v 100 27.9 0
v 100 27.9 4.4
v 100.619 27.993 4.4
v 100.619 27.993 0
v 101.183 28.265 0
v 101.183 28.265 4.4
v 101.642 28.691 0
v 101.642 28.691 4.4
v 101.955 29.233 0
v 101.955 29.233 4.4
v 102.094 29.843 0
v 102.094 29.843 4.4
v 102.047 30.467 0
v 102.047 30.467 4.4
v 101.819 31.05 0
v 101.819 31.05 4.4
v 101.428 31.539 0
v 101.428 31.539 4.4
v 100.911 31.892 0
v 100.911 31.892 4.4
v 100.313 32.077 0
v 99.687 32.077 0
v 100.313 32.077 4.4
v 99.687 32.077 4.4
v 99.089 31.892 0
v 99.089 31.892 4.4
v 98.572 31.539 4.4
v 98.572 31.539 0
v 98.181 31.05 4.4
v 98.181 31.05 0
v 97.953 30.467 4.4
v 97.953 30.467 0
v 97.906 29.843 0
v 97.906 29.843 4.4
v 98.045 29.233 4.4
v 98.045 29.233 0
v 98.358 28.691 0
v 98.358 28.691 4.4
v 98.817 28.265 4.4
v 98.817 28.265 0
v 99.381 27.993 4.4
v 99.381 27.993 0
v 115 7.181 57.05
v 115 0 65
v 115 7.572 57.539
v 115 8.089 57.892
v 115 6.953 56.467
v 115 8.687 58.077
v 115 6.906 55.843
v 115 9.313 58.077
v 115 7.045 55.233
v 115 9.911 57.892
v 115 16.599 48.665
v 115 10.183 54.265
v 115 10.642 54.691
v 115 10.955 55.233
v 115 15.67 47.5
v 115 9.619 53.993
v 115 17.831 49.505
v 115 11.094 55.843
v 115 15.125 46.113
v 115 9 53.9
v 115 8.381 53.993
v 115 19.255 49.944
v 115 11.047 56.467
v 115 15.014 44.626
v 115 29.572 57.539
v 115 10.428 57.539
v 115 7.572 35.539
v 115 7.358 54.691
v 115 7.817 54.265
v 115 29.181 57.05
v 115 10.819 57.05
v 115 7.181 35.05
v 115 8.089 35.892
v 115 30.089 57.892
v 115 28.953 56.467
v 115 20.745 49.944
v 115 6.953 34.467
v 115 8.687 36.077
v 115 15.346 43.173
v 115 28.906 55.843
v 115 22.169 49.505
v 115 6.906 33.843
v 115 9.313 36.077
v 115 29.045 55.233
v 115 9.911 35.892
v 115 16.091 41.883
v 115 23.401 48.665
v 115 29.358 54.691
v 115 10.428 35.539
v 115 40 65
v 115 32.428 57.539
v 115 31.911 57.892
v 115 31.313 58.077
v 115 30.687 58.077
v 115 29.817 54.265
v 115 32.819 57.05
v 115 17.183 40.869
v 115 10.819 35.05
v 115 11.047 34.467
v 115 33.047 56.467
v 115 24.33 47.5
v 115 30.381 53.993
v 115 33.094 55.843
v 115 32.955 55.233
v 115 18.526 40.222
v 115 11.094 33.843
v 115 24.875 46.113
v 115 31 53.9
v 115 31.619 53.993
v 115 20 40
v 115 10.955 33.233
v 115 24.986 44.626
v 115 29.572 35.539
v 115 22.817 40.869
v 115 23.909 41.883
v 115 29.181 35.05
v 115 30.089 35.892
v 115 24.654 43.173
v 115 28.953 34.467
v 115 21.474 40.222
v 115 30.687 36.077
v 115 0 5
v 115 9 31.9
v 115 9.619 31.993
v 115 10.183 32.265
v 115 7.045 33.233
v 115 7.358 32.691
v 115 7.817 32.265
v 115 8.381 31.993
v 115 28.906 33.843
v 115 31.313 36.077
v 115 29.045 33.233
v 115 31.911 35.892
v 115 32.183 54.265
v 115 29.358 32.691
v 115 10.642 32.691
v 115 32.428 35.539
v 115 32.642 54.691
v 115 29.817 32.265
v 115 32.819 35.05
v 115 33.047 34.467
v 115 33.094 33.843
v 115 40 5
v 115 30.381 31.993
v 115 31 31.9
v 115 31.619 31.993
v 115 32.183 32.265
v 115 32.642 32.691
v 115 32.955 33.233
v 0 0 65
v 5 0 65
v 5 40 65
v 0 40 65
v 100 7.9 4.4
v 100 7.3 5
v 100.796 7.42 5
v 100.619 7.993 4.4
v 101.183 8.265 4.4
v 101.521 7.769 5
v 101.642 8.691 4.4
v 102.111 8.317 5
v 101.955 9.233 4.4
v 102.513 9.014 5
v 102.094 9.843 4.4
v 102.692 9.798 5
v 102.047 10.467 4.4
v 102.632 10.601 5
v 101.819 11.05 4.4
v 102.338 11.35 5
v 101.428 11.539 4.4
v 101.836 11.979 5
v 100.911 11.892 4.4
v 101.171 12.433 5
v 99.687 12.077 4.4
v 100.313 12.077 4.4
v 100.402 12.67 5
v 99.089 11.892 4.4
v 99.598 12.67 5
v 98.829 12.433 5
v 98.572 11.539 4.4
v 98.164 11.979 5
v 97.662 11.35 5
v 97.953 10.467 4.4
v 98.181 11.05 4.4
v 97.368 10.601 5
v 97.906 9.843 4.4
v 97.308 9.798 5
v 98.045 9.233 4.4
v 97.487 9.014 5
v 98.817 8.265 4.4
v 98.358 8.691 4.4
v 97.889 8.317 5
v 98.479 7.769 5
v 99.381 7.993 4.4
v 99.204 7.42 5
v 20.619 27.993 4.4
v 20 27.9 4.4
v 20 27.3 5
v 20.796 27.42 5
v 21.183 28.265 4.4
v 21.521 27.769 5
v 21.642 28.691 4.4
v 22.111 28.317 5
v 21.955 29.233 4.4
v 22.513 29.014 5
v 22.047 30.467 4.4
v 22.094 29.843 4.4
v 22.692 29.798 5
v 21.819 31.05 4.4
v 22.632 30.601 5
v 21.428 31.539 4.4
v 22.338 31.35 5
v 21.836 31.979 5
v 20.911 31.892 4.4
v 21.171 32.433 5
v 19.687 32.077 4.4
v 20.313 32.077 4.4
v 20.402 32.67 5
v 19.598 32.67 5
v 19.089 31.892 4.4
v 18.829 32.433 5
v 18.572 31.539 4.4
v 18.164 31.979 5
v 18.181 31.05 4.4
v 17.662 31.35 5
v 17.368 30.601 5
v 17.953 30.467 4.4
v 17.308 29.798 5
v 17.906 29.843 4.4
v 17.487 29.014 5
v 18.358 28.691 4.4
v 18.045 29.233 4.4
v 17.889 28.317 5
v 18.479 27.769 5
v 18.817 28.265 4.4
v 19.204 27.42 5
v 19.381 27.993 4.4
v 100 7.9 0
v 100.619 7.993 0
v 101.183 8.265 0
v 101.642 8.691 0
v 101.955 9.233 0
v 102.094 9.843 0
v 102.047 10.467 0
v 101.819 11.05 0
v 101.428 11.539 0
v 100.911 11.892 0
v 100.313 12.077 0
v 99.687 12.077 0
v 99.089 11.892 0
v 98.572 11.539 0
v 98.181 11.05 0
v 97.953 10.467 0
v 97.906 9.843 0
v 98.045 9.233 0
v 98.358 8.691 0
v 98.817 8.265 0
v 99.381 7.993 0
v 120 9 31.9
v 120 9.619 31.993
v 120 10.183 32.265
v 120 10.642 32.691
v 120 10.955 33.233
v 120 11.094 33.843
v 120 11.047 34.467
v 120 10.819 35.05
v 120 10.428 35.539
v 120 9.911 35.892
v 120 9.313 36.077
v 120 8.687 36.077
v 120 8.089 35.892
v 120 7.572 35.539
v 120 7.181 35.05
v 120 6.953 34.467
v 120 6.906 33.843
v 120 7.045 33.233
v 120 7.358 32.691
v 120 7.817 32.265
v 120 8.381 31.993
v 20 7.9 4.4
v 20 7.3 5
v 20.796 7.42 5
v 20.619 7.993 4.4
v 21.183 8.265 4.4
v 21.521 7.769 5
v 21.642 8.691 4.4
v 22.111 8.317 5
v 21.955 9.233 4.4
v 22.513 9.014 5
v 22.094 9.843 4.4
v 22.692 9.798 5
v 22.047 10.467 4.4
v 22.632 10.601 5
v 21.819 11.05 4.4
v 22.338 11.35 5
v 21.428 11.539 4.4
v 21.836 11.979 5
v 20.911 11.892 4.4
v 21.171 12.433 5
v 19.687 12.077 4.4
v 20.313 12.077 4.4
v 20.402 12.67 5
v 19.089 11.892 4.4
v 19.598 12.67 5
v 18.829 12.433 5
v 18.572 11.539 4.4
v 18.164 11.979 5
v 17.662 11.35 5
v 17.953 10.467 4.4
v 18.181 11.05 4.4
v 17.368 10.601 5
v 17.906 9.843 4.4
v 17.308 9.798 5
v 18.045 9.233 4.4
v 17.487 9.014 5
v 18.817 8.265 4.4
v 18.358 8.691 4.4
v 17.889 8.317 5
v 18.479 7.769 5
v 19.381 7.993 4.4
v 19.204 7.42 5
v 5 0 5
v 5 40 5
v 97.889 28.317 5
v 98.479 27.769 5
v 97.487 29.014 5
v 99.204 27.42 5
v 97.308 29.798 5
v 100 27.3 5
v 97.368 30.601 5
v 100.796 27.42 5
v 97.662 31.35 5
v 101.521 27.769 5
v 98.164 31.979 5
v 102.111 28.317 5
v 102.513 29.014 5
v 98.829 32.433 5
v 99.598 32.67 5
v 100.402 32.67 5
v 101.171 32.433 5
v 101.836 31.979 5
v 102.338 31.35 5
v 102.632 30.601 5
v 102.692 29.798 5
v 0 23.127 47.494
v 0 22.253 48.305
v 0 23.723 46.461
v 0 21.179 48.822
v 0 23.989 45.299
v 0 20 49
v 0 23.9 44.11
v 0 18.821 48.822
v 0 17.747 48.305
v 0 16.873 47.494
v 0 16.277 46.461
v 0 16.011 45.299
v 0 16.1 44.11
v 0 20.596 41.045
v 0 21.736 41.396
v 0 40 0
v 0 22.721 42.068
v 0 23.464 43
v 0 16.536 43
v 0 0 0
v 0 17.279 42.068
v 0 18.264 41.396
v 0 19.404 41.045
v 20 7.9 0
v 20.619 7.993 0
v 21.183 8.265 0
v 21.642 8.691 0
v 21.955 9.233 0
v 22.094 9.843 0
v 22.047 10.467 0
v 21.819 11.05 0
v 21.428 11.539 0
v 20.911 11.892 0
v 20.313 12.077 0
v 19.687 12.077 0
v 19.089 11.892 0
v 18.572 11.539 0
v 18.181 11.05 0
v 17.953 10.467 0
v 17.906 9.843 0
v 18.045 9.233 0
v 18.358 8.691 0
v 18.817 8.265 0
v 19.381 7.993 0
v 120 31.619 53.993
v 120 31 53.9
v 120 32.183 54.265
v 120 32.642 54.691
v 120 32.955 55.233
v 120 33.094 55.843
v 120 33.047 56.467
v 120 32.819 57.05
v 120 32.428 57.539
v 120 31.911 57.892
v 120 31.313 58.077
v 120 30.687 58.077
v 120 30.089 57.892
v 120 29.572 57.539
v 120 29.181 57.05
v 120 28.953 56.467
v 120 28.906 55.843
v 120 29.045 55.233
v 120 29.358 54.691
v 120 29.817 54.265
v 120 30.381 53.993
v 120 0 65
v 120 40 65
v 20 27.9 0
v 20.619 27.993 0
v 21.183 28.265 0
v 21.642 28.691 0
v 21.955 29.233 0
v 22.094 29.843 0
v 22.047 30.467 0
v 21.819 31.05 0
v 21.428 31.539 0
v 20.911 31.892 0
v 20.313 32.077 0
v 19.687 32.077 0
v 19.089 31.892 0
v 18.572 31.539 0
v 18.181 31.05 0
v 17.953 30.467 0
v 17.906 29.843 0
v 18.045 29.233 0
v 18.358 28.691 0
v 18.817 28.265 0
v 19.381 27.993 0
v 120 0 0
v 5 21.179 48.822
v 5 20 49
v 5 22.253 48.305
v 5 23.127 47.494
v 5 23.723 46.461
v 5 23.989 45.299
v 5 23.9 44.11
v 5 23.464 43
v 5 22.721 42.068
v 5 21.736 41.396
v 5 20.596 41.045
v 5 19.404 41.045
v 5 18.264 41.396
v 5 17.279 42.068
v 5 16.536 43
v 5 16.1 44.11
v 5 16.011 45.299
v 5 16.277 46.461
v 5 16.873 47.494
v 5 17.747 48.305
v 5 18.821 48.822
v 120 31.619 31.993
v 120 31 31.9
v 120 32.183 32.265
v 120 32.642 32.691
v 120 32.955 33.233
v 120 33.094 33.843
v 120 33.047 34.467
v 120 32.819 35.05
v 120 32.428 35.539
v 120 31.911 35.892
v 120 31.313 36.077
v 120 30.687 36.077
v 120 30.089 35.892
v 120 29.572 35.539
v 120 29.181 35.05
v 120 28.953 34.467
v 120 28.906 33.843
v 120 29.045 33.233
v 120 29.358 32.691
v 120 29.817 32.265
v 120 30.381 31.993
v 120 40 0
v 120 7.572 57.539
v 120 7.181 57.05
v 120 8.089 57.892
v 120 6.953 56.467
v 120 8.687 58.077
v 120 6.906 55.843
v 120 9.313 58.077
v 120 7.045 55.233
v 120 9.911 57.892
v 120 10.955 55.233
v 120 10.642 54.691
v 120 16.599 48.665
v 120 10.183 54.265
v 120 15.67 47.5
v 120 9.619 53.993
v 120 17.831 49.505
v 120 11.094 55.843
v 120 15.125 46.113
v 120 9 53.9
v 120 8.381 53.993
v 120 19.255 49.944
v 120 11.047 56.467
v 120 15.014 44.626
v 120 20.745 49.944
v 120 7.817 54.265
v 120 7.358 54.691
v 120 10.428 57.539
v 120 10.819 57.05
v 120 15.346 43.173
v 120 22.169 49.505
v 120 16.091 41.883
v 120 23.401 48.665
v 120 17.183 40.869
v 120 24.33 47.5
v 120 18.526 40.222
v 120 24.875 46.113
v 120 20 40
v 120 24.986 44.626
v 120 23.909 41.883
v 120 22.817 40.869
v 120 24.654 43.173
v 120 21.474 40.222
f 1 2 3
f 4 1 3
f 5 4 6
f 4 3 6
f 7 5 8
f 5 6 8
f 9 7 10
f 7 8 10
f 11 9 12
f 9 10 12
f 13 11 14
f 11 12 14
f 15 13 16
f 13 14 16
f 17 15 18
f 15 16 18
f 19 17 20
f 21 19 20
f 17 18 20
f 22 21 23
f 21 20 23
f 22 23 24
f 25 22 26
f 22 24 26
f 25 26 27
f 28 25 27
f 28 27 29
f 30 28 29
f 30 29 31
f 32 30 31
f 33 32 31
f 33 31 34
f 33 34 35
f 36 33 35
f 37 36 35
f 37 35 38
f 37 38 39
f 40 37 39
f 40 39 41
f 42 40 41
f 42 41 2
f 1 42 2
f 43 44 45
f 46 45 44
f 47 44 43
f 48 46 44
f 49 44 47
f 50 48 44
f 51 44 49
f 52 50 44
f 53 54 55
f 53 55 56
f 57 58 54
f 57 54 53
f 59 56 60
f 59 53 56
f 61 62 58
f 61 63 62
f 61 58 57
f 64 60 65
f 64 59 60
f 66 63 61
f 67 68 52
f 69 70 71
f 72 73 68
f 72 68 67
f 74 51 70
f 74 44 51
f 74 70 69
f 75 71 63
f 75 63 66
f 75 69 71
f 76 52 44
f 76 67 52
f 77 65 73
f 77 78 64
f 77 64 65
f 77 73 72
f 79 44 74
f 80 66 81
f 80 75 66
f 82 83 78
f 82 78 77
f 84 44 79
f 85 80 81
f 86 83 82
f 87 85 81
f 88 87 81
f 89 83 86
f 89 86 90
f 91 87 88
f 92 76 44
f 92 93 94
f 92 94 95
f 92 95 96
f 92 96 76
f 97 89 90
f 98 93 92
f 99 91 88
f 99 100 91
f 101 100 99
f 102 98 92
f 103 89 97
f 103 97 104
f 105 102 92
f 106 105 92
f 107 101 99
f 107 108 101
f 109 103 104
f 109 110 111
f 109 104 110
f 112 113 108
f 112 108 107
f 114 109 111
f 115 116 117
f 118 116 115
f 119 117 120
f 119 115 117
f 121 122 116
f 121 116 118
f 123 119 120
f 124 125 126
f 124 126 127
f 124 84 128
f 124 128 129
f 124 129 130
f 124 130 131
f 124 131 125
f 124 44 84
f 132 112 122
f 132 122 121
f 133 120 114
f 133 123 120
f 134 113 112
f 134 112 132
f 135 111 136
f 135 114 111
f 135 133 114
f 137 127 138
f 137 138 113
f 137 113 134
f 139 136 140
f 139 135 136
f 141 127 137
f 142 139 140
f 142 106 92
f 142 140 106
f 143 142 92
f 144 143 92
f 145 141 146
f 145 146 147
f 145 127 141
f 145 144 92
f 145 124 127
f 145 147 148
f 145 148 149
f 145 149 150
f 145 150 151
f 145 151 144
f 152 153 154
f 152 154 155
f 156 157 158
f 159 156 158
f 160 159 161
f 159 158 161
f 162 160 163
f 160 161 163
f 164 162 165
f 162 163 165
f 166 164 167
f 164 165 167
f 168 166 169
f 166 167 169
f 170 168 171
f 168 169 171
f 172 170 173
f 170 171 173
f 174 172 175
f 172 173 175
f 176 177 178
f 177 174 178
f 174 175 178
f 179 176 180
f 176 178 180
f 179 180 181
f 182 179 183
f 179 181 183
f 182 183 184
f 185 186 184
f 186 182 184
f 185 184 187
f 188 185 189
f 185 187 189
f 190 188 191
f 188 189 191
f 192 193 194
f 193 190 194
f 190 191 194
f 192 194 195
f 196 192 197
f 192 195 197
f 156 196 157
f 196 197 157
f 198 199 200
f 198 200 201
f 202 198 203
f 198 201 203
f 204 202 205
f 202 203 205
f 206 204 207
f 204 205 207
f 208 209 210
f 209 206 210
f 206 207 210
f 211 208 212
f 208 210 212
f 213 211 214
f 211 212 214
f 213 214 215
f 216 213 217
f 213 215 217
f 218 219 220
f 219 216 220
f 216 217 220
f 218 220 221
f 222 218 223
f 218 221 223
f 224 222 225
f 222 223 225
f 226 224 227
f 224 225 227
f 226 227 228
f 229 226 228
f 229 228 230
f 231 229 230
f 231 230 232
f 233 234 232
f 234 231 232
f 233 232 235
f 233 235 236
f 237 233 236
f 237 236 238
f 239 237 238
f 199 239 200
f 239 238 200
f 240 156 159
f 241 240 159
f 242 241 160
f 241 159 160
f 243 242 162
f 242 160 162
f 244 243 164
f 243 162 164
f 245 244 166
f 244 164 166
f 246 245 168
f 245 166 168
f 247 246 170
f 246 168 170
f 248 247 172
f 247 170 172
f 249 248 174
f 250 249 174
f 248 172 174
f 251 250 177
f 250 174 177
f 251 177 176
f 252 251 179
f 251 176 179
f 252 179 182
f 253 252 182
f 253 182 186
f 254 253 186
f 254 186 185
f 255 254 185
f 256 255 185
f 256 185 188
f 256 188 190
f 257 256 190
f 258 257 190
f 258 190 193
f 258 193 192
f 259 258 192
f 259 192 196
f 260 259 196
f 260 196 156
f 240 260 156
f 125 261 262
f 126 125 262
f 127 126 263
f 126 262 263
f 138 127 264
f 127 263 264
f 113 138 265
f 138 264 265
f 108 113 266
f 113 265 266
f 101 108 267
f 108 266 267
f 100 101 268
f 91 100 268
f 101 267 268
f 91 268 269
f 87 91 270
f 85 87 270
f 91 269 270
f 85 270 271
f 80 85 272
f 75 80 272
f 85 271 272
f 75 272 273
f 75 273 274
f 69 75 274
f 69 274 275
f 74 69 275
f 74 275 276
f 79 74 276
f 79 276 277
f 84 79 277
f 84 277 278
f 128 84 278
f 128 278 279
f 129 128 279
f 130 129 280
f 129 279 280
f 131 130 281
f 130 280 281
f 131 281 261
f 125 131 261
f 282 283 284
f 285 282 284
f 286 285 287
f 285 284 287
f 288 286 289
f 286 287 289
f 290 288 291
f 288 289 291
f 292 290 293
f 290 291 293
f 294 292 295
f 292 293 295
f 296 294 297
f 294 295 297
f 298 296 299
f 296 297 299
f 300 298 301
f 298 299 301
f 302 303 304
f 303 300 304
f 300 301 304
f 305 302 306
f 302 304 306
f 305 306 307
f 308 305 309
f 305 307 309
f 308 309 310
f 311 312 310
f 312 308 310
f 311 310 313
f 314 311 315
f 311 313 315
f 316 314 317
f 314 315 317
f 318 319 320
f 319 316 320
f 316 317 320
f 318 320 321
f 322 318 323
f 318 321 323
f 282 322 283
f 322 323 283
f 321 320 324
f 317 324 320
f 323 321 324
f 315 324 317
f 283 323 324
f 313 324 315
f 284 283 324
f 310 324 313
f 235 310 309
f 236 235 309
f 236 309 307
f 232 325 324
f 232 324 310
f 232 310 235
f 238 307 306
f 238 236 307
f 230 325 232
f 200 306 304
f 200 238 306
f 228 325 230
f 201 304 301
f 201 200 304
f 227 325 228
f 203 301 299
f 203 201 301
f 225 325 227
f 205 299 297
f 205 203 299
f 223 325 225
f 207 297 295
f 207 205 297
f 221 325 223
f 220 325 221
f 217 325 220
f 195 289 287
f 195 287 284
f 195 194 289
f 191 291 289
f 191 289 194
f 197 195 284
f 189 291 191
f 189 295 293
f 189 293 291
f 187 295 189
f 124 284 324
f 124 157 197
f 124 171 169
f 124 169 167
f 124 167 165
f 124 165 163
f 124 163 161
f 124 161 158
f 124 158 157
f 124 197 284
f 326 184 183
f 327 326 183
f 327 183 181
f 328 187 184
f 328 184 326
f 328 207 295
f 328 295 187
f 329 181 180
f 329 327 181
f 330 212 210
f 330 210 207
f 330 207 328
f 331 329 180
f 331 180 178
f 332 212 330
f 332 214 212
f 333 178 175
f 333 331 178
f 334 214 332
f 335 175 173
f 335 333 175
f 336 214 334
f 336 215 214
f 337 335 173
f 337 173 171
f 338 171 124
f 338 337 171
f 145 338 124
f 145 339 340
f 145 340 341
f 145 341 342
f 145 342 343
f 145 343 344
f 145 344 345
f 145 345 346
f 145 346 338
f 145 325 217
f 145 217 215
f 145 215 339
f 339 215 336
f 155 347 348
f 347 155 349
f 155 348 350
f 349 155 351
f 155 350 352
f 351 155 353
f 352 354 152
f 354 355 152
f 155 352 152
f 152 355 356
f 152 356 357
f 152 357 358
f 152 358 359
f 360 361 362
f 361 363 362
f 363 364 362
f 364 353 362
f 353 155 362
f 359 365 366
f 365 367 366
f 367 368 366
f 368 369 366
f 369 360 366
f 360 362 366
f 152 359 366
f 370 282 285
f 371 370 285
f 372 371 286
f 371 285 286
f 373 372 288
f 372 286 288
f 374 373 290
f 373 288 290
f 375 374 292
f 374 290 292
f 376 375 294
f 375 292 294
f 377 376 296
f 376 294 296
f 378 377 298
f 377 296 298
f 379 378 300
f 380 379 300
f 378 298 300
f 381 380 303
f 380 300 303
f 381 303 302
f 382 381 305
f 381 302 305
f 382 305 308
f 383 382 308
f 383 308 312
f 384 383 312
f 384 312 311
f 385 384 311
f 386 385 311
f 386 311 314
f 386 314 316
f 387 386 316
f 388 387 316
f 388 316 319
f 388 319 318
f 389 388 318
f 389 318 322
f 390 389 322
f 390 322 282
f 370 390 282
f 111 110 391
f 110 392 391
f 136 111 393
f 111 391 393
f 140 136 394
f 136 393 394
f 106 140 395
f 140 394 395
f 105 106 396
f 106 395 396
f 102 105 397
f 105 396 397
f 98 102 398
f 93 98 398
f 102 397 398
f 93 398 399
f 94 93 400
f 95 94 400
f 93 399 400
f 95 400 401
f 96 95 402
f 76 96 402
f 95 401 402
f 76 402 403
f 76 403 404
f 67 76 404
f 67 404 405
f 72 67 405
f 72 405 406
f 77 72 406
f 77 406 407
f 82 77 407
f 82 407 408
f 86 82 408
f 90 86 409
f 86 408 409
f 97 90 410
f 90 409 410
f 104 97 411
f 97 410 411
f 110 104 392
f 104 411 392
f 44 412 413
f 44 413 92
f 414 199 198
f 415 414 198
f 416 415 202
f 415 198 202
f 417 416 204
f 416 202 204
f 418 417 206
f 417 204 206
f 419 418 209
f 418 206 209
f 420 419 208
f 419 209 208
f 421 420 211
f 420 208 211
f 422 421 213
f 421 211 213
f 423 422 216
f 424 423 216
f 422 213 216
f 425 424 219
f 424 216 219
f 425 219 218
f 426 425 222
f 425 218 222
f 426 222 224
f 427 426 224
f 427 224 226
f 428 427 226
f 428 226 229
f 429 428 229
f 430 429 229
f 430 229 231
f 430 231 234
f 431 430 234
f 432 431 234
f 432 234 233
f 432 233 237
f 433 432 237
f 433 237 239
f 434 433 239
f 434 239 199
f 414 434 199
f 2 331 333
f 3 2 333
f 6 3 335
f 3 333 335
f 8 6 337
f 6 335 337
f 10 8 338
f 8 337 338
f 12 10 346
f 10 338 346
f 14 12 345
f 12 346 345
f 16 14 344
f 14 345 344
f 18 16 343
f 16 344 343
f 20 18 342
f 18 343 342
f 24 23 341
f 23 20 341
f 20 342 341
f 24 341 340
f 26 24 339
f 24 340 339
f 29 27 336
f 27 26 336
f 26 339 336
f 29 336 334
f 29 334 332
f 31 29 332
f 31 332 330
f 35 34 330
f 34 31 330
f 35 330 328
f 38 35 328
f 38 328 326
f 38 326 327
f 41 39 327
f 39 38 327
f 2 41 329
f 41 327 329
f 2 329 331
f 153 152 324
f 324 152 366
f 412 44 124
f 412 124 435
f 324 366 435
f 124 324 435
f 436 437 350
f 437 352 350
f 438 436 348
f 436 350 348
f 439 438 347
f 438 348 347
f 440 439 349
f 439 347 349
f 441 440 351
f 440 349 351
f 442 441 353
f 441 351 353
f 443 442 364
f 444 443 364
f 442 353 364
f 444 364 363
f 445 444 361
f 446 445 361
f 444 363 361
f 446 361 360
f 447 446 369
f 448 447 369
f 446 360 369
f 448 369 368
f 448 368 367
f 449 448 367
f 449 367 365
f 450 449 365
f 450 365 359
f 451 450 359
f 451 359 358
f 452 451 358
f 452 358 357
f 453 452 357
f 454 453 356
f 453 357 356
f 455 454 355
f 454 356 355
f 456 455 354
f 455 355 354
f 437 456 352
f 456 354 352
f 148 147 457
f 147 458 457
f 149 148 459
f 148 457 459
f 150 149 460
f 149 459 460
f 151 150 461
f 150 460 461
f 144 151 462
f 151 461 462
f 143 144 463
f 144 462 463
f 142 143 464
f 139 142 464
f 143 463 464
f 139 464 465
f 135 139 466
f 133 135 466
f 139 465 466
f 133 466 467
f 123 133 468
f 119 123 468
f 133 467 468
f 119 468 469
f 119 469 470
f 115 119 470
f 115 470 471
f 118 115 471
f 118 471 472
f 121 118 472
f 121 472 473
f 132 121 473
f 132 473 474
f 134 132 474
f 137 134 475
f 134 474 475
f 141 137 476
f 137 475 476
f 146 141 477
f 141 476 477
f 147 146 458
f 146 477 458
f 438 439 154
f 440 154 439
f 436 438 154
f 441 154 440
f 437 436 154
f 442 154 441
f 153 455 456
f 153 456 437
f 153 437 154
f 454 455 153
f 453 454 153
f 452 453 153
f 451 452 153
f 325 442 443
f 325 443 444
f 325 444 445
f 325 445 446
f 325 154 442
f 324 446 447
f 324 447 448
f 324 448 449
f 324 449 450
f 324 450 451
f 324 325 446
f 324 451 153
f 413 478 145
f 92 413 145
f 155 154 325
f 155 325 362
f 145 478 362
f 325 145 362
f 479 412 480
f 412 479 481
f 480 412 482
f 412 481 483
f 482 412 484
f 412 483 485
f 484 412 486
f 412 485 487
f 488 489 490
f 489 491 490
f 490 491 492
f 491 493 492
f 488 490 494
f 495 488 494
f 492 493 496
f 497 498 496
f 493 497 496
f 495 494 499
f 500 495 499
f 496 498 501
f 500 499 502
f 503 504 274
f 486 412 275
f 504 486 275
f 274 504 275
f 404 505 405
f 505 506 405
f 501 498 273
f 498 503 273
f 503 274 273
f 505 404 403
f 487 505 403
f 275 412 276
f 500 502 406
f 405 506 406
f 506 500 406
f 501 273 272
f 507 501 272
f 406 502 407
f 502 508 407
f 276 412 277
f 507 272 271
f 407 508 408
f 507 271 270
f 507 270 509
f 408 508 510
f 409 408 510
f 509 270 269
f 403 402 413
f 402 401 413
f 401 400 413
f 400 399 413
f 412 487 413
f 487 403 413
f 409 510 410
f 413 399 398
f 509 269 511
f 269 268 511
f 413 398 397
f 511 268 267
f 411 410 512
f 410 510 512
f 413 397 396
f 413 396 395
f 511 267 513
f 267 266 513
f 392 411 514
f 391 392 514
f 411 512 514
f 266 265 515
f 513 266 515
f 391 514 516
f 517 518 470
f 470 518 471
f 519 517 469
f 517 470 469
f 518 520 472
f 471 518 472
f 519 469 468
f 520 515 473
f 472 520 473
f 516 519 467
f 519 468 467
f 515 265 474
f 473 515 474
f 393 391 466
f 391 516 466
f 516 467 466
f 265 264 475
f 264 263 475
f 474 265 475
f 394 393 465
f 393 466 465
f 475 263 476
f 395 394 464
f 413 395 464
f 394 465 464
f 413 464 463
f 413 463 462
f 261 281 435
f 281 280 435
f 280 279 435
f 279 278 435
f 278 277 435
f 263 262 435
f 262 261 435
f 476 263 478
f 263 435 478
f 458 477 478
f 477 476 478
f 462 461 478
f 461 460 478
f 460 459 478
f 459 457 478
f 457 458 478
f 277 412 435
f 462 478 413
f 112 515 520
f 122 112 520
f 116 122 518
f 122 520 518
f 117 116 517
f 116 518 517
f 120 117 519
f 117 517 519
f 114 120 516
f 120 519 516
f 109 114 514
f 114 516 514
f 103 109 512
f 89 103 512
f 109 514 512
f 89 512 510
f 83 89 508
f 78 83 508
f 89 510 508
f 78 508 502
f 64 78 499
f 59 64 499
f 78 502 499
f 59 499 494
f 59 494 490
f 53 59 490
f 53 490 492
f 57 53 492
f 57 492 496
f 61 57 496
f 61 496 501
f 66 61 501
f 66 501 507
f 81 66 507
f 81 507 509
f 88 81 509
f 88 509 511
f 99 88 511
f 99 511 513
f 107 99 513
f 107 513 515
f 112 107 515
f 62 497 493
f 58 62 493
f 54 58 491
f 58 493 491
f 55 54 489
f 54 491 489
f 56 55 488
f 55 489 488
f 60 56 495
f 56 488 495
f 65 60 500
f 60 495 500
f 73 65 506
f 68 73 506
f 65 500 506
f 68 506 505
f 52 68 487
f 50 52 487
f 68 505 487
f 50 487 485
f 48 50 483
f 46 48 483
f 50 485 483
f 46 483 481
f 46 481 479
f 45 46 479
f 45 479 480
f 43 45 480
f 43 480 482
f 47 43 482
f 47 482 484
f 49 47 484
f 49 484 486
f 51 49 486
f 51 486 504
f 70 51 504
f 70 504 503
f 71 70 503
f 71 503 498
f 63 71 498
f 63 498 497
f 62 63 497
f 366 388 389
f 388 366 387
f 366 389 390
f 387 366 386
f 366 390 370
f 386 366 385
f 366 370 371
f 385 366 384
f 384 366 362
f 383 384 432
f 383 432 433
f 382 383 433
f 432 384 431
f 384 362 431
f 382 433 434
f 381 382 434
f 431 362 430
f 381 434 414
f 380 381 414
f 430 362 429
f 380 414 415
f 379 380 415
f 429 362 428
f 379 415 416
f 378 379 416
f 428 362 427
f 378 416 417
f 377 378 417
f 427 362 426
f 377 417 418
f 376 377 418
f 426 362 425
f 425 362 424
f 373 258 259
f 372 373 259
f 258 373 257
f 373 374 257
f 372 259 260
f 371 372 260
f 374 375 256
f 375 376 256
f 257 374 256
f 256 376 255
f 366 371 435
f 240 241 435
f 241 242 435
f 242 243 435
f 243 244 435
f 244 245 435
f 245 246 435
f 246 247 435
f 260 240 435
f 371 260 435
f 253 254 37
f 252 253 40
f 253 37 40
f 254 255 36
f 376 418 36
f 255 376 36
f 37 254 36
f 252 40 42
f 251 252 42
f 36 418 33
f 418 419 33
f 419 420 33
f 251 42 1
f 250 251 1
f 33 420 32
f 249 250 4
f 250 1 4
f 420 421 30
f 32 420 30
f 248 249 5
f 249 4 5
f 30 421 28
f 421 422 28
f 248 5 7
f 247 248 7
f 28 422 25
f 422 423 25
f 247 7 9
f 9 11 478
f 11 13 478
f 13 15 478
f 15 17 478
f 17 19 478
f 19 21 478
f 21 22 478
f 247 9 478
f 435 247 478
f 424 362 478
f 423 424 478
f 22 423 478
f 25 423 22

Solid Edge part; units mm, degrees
sketch "Sketch1" plane through (0, 0, 0) normal (0, 0, 1) x (1, 0, 0)
  line L0 (120, 40) -> (0, 40)
  line L1 (0, 40) -> (0, 0)
  line L2 (0, 0) -> (120, 0)
  line L3 (120, 0) -> (120, 40)
extrude "Protrusion1" add sketch "Sketch1" along normal blind 5
sketch "Sketch2" plane through (60, 20, 5) normal (0, 0, 1) x (1, 0, 0)
  line L0 (55, -20) -> (55, 20)
  line L1 (55, 20) -> (60, 20)
  line L2 (60, 20) -> (60, -20)
  line L3 (60, -20) -> (55, -20)
  line L4 (-55, 20) -> (-55, -20)
  line L5 (-55, -20) -> (-60, -20)
  line L6 (-60, -20) -> (-60, 20)
  line L7 (-60, 20) -> (-55, 20)
  dimension "D1" = 5
extrude "Extrusionsausprägung_2" add sketch "Sketch2" along normal blind 60
hole "Bohrung_1" at (120, 20, 45) direction (-1, 0, 0) diameter 10 end up to next
hole "Hole_2" at (20, 10, 5) direction (0, 0, -1) diameter 4.2 end up to next start chamfer 0.6 start chamfer angle 45
hole "Hole1" at (20, 30, 5) direction (0, 0, -1) diameter 4.2 end up to next start chamfer 0.6 start chamfer angle 45
hole "Hole2" at (100, 30, 5) direction (0, 0, -1) diameter 4.2 end up to next start chamfer 0.6 start chamfer angle 45
hole "Hole3" at (100, 10, 5) direction (0, 0, -1) diameter 4.2 end up to next start chamfer 0.6 start chamfer angle 45
hole "Hole4" at (120, 9, 56) direction (-1, 0, 0) diameter 4.2 end up to next
hole "Hole5" at (120, 9, 34) direction (-1, 0, 0) diameter 4.2 end up to next
hole "Hole6" at (120, 31, 34) direction (-1, 0, 0) diameter 4.2 end up to next
hole "Hole7" at (120, 31, 56) direction (-1, 0, 0) diameter 4.2 end up to next
hole "Hole_10" at (0, 20, 45) direction (1, 0, 0) diameter 8 end up to next
